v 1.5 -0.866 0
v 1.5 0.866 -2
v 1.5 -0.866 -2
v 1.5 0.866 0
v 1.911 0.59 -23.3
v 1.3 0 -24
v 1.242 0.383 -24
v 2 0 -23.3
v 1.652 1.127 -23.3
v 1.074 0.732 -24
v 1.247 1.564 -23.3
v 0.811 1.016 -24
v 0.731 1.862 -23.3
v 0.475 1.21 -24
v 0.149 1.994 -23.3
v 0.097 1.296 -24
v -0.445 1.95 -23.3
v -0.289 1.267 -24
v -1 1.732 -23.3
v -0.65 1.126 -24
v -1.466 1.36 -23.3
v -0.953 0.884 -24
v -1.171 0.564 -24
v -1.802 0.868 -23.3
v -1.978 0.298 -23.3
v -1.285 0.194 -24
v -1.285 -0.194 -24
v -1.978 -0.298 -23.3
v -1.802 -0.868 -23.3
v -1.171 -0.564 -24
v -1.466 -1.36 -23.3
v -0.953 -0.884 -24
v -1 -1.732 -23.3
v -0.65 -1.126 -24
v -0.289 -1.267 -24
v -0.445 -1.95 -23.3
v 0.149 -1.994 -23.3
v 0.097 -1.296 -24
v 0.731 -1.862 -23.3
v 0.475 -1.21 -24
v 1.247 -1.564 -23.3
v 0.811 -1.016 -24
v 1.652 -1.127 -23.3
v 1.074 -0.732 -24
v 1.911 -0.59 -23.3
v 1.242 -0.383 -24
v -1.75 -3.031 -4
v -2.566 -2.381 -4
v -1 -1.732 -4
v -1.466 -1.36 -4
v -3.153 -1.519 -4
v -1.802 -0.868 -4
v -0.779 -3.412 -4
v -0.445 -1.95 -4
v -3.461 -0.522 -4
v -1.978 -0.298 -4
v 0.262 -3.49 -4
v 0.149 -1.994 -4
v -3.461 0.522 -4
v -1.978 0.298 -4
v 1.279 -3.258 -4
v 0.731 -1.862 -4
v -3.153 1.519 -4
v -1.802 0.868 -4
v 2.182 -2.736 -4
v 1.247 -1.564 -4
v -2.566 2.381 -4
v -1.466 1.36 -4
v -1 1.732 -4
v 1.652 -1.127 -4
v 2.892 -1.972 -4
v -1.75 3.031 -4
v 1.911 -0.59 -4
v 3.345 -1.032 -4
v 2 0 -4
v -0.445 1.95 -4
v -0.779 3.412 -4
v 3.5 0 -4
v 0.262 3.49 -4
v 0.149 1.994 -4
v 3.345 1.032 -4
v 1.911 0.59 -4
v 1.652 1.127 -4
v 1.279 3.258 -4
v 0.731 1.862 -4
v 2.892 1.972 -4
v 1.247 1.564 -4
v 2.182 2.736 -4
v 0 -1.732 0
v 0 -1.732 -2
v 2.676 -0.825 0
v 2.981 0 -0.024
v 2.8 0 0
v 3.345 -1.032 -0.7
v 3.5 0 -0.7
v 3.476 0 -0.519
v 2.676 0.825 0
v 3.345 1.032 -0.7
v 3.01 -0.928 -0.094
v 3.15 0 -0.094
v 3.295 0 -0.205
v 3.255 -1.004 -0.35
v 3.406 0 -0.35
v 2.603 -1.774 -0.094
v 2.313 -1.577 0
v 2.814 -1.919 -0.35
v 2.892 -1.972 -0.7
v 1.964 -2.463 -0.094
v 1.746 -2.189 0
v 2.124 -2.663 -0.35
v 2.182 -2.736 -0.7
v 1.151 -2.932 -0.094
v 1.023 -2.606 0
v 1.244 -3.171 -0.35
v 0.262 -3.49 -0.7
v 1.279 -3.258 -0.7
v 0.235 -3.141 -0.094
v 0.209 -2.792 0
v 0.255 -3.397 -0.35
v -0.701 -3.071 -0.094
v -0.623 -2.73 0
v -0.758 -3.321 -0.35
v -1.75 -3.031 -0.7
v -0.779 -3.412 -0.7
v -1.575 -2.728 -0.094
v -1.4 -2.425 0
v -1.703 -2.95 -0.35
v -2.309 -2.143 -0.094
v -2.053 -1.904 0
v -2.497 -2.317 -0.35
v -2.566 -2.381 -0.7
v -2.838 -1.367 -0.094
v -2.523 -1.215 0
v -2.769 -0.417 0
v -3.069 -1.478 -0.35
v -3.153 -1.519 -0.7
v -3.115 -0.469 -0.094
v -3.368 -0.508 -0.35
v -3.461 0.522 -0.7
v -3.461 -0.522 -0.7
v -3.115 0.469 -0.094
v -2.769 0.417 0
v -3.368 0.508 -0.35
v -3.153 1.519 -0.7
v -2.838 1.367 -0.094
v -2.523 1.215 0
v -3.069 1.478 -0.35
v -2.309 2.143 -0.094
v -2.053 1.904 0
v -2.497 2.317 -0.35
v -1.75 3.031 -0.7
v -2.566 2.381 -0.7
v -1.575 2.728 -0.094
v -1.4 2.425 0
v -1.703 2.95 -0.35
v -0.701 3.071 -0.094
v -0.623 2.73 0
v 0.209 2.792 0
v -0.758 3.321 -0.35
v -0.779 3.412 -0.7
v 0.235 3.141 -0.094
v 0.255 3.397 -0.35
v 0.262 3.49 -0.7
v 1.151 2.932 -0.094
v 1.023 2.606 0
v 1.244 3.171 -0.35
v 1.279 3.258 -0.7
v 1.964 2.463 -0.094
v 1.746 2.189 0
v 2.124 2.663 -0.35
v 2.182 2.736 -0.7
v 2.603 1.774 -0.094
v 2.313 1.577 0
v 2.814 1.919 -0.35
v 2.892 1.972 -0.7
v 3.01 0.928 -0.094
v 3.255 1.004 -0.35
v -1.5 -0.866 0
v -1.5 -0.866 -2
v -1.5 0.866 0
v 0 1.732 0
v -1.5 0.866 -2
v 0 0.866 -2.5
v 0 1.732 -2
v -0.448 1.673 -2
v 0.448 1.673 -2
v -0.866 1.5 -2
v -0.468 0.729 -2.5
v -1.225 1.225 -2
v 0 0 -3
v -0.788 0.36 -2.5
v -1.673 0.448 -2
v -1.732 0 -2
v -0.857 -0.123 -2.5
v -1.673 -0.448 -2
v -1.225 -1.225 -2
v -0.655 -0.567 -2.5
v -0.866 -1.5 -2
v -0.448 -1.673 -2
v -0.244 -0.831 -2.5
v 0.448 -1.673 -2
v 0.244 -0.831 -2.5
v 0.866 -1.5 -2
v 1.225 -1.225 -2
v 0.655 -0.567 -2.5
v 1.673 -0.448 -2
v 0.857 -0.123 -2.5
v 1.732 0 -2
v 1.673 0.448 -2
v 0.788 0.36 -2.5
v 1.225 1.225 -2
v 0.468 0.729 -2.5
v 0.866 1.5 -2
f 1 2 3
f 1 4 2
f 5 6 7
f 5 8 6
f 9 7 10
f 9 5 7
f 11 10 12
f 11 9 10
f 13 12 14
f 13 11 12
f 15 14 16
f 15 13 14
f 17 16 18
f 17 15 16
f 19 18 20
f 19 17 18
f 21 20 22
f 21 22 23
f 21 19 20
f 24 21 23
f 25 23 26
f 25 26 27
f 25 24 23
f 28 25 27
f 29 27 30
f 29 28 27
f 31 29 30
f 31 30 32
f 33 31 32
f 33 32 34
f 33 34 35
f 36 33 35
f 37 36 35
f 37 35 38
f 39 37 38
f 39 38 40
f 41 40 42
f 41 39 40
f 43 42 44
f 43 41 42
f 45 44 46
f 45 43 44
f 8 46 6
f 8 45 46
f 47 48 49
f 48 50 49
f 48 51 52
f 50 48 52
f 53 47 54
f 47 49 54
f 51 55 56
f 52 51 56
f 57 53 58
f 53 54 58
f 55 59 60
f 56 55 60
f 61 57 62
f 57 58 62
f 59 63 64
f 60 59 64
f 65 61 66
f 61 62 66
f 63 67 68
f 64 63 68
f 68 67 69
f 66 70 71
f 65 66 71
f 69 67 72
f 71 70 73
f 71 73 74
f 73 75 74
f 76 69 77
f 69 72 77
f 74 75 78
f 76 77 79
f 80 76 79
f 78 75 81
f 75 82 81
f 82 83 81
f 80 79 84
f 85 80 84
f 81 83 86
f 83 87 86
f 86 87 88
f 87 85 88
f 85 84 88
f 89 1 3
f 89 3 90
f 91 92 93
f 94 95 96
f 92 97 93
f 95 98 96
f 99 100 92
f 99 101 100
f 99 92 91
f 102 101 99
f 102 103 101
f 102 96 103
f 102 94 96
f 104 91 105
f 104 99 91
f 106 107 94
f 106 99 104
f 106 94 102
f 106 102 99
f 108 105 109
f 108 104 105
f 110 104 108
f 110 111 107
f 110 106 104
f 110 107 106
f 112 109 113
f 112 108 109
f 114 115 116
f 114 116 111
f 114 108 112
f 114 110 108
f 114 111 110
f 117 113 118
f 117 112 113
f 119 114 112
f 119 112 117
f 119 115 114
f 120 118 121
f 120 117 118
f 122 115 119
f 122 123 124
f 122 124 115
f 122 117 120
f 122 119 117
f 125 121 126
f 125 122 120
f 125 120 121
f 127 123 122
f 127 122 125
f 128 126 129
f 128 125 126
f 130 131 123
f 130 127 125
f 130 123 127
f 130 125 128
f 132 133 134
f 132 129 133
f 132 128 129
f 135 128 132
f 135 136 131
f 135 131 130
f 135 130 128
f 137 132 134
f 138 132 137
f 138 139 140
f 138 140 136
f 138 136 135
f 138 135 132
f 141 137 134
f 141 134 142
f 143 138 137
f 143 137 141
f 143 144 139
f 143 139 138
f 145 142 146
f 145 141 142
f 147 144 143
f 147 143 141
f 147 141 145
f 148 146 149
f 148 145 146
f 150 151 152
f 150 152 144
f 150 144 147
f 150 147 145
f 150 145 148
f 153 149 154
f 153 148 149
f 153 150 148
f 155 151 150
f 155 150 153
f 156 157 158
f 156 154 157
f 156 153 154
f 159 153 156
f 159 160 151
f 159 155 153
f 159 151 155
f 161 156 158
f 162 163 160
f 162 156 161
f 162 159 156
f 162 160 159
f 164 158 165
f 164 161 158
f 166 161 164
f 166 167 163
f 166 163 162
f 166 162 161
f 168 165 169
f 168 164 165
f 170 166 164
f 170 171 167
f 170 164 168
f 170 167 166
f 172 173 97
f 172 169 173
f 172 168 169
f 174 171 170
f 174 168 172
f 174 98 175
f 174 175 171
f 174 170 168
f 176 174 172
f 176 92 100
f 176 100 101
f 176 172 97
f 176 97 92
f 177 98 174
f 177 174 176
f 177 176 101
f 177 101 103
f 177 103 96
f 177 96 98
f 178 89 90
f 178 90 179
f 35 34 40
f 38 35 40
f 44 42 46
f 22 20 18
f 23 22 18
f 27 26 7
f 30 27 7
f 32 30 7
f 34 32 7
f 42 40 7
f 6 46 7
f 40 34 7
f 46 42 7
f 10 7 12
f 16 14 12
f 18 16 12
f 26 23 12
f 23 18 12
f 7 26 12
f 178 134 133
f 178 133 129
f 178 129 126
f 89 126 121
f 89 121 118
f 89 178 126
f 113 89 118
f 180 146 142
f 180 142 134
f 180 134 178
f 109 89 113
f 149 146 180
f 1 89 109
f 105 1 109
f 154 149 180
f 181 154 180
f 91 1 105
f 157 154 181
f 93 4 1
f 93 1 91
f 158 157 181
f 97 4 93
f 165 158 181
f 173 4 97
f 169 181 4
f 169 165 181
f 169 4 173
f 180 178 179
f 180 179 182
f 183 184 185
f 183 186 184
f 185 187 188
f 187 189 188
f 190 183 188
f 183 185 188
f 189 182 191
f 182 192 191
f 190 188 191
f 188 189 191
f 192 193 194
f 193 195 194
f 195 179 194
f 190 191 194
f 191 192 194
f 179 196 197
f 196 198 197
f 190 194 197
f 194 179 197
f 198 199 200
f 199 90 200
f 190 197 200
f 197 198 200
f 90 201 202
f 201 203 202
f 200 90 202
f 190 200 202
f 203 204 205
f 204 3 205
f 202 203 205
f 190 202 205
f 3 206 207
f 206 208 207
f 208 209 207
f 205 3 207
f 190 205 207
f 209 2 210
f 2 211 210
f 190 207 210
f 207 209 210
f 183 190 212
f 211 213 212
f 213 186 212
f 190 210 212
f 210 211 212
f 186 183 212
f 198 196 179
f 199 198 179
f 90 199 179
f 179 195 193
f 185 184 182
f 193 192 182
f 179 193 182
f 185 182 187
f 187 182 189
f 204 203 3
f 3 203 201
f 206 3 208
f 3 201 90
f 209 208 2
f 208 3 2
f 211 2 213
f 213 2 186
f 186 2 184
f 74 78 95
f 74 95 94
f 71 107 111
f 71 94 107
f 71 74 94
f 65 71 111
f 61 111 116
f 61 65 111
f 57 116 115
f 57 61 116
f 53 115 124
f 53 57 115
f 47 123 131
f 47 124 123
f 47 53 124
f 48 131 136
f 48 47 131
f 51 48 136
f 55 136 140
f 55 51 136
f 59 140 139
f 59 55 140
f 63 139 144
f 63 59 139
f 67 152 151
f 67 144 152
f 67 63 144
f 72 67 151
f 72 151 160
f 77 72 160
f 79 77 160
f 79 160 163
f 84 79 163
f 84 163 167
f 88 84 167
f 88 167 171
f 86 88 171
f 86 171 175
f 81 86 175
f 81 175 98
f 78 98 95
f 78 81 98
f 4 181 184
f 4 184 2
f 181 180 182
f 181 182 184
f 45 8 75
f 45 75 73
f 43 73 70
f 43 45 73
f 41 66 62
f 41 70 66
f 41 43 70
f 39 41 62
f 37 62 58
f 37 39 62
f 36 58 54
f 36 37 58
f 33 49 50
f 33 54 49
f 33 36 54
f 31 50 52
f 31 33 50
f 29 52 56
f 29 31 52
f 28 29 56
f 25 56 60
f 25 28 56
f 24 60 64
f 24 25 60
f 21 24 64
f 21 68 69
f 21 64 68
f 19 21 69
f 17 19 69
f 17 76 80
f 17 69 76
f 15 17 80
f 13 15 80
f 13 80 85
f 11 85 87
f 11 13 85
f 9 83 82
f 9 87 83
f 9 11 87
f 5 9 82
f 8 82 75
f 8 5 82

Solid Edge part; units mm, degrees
sketch "Sketch1" plane through (0, 0, 0) normal (0, -1, 0) x (1, 0, 0)
  line L0 (0, 0) -> (2.8, 0)
  arc A0 (2.8, 0) -> (3.5, -0.7) centre (2.8, -0.7) cw
  line L1 (3.5, -0.7) -> (3.5, -4)
  line L2 (3.5, -4) -> (2, -4)
  line L3 (2, -4) -> (2, -23.3)
  line L4 (2, -23.3) -> (1.3, -24)
  line L5 (1.3, -24) -> (0, -24)
revolve "RevolvedProtrusion1" add sketch "Sketch1" angle 360 about axis through (0, 0, -24) along (0, 0, 1)
sketch "Sketch2" plane through (0, 0, 0) normal (0, 0, 1) x (1, 0, 0)
  line L0 (-1.5, -0.866) -> (-1.5, 0.866)
  line L1 (-1.5, 0.866) -> (0, 1.7321)
  line L2 (0, 1.7321) -> (1.5, 0.866)
  line L3 (1.5, 0.866) -> (1.5, -0.866)
  line L4 (1.5, -0.866) -> (0, -1.7321)
  line L5 (0, -1.7321) -> (-1.5, -0.866)
extrude "Cutout1" cut sketch "Sketch2" against normal blind 2
sketch "Sketch3" plane through (0, 0, 0) normal (1, 0, 0) x (0, 1, 0)
  line L0 (0, -3) -> (1.7321, -2)
  line L1 (0, -2) -> (1.7321, -2)
  line L2 (0, -2) -> (0, -3)
revolve "RevolvedCutout1" cut sketch "Sketch3" angle 360 about axis through (0, 0, -60.325) along (0, 0, 1)
cosmetic_thread "Thread1" size "M4"
